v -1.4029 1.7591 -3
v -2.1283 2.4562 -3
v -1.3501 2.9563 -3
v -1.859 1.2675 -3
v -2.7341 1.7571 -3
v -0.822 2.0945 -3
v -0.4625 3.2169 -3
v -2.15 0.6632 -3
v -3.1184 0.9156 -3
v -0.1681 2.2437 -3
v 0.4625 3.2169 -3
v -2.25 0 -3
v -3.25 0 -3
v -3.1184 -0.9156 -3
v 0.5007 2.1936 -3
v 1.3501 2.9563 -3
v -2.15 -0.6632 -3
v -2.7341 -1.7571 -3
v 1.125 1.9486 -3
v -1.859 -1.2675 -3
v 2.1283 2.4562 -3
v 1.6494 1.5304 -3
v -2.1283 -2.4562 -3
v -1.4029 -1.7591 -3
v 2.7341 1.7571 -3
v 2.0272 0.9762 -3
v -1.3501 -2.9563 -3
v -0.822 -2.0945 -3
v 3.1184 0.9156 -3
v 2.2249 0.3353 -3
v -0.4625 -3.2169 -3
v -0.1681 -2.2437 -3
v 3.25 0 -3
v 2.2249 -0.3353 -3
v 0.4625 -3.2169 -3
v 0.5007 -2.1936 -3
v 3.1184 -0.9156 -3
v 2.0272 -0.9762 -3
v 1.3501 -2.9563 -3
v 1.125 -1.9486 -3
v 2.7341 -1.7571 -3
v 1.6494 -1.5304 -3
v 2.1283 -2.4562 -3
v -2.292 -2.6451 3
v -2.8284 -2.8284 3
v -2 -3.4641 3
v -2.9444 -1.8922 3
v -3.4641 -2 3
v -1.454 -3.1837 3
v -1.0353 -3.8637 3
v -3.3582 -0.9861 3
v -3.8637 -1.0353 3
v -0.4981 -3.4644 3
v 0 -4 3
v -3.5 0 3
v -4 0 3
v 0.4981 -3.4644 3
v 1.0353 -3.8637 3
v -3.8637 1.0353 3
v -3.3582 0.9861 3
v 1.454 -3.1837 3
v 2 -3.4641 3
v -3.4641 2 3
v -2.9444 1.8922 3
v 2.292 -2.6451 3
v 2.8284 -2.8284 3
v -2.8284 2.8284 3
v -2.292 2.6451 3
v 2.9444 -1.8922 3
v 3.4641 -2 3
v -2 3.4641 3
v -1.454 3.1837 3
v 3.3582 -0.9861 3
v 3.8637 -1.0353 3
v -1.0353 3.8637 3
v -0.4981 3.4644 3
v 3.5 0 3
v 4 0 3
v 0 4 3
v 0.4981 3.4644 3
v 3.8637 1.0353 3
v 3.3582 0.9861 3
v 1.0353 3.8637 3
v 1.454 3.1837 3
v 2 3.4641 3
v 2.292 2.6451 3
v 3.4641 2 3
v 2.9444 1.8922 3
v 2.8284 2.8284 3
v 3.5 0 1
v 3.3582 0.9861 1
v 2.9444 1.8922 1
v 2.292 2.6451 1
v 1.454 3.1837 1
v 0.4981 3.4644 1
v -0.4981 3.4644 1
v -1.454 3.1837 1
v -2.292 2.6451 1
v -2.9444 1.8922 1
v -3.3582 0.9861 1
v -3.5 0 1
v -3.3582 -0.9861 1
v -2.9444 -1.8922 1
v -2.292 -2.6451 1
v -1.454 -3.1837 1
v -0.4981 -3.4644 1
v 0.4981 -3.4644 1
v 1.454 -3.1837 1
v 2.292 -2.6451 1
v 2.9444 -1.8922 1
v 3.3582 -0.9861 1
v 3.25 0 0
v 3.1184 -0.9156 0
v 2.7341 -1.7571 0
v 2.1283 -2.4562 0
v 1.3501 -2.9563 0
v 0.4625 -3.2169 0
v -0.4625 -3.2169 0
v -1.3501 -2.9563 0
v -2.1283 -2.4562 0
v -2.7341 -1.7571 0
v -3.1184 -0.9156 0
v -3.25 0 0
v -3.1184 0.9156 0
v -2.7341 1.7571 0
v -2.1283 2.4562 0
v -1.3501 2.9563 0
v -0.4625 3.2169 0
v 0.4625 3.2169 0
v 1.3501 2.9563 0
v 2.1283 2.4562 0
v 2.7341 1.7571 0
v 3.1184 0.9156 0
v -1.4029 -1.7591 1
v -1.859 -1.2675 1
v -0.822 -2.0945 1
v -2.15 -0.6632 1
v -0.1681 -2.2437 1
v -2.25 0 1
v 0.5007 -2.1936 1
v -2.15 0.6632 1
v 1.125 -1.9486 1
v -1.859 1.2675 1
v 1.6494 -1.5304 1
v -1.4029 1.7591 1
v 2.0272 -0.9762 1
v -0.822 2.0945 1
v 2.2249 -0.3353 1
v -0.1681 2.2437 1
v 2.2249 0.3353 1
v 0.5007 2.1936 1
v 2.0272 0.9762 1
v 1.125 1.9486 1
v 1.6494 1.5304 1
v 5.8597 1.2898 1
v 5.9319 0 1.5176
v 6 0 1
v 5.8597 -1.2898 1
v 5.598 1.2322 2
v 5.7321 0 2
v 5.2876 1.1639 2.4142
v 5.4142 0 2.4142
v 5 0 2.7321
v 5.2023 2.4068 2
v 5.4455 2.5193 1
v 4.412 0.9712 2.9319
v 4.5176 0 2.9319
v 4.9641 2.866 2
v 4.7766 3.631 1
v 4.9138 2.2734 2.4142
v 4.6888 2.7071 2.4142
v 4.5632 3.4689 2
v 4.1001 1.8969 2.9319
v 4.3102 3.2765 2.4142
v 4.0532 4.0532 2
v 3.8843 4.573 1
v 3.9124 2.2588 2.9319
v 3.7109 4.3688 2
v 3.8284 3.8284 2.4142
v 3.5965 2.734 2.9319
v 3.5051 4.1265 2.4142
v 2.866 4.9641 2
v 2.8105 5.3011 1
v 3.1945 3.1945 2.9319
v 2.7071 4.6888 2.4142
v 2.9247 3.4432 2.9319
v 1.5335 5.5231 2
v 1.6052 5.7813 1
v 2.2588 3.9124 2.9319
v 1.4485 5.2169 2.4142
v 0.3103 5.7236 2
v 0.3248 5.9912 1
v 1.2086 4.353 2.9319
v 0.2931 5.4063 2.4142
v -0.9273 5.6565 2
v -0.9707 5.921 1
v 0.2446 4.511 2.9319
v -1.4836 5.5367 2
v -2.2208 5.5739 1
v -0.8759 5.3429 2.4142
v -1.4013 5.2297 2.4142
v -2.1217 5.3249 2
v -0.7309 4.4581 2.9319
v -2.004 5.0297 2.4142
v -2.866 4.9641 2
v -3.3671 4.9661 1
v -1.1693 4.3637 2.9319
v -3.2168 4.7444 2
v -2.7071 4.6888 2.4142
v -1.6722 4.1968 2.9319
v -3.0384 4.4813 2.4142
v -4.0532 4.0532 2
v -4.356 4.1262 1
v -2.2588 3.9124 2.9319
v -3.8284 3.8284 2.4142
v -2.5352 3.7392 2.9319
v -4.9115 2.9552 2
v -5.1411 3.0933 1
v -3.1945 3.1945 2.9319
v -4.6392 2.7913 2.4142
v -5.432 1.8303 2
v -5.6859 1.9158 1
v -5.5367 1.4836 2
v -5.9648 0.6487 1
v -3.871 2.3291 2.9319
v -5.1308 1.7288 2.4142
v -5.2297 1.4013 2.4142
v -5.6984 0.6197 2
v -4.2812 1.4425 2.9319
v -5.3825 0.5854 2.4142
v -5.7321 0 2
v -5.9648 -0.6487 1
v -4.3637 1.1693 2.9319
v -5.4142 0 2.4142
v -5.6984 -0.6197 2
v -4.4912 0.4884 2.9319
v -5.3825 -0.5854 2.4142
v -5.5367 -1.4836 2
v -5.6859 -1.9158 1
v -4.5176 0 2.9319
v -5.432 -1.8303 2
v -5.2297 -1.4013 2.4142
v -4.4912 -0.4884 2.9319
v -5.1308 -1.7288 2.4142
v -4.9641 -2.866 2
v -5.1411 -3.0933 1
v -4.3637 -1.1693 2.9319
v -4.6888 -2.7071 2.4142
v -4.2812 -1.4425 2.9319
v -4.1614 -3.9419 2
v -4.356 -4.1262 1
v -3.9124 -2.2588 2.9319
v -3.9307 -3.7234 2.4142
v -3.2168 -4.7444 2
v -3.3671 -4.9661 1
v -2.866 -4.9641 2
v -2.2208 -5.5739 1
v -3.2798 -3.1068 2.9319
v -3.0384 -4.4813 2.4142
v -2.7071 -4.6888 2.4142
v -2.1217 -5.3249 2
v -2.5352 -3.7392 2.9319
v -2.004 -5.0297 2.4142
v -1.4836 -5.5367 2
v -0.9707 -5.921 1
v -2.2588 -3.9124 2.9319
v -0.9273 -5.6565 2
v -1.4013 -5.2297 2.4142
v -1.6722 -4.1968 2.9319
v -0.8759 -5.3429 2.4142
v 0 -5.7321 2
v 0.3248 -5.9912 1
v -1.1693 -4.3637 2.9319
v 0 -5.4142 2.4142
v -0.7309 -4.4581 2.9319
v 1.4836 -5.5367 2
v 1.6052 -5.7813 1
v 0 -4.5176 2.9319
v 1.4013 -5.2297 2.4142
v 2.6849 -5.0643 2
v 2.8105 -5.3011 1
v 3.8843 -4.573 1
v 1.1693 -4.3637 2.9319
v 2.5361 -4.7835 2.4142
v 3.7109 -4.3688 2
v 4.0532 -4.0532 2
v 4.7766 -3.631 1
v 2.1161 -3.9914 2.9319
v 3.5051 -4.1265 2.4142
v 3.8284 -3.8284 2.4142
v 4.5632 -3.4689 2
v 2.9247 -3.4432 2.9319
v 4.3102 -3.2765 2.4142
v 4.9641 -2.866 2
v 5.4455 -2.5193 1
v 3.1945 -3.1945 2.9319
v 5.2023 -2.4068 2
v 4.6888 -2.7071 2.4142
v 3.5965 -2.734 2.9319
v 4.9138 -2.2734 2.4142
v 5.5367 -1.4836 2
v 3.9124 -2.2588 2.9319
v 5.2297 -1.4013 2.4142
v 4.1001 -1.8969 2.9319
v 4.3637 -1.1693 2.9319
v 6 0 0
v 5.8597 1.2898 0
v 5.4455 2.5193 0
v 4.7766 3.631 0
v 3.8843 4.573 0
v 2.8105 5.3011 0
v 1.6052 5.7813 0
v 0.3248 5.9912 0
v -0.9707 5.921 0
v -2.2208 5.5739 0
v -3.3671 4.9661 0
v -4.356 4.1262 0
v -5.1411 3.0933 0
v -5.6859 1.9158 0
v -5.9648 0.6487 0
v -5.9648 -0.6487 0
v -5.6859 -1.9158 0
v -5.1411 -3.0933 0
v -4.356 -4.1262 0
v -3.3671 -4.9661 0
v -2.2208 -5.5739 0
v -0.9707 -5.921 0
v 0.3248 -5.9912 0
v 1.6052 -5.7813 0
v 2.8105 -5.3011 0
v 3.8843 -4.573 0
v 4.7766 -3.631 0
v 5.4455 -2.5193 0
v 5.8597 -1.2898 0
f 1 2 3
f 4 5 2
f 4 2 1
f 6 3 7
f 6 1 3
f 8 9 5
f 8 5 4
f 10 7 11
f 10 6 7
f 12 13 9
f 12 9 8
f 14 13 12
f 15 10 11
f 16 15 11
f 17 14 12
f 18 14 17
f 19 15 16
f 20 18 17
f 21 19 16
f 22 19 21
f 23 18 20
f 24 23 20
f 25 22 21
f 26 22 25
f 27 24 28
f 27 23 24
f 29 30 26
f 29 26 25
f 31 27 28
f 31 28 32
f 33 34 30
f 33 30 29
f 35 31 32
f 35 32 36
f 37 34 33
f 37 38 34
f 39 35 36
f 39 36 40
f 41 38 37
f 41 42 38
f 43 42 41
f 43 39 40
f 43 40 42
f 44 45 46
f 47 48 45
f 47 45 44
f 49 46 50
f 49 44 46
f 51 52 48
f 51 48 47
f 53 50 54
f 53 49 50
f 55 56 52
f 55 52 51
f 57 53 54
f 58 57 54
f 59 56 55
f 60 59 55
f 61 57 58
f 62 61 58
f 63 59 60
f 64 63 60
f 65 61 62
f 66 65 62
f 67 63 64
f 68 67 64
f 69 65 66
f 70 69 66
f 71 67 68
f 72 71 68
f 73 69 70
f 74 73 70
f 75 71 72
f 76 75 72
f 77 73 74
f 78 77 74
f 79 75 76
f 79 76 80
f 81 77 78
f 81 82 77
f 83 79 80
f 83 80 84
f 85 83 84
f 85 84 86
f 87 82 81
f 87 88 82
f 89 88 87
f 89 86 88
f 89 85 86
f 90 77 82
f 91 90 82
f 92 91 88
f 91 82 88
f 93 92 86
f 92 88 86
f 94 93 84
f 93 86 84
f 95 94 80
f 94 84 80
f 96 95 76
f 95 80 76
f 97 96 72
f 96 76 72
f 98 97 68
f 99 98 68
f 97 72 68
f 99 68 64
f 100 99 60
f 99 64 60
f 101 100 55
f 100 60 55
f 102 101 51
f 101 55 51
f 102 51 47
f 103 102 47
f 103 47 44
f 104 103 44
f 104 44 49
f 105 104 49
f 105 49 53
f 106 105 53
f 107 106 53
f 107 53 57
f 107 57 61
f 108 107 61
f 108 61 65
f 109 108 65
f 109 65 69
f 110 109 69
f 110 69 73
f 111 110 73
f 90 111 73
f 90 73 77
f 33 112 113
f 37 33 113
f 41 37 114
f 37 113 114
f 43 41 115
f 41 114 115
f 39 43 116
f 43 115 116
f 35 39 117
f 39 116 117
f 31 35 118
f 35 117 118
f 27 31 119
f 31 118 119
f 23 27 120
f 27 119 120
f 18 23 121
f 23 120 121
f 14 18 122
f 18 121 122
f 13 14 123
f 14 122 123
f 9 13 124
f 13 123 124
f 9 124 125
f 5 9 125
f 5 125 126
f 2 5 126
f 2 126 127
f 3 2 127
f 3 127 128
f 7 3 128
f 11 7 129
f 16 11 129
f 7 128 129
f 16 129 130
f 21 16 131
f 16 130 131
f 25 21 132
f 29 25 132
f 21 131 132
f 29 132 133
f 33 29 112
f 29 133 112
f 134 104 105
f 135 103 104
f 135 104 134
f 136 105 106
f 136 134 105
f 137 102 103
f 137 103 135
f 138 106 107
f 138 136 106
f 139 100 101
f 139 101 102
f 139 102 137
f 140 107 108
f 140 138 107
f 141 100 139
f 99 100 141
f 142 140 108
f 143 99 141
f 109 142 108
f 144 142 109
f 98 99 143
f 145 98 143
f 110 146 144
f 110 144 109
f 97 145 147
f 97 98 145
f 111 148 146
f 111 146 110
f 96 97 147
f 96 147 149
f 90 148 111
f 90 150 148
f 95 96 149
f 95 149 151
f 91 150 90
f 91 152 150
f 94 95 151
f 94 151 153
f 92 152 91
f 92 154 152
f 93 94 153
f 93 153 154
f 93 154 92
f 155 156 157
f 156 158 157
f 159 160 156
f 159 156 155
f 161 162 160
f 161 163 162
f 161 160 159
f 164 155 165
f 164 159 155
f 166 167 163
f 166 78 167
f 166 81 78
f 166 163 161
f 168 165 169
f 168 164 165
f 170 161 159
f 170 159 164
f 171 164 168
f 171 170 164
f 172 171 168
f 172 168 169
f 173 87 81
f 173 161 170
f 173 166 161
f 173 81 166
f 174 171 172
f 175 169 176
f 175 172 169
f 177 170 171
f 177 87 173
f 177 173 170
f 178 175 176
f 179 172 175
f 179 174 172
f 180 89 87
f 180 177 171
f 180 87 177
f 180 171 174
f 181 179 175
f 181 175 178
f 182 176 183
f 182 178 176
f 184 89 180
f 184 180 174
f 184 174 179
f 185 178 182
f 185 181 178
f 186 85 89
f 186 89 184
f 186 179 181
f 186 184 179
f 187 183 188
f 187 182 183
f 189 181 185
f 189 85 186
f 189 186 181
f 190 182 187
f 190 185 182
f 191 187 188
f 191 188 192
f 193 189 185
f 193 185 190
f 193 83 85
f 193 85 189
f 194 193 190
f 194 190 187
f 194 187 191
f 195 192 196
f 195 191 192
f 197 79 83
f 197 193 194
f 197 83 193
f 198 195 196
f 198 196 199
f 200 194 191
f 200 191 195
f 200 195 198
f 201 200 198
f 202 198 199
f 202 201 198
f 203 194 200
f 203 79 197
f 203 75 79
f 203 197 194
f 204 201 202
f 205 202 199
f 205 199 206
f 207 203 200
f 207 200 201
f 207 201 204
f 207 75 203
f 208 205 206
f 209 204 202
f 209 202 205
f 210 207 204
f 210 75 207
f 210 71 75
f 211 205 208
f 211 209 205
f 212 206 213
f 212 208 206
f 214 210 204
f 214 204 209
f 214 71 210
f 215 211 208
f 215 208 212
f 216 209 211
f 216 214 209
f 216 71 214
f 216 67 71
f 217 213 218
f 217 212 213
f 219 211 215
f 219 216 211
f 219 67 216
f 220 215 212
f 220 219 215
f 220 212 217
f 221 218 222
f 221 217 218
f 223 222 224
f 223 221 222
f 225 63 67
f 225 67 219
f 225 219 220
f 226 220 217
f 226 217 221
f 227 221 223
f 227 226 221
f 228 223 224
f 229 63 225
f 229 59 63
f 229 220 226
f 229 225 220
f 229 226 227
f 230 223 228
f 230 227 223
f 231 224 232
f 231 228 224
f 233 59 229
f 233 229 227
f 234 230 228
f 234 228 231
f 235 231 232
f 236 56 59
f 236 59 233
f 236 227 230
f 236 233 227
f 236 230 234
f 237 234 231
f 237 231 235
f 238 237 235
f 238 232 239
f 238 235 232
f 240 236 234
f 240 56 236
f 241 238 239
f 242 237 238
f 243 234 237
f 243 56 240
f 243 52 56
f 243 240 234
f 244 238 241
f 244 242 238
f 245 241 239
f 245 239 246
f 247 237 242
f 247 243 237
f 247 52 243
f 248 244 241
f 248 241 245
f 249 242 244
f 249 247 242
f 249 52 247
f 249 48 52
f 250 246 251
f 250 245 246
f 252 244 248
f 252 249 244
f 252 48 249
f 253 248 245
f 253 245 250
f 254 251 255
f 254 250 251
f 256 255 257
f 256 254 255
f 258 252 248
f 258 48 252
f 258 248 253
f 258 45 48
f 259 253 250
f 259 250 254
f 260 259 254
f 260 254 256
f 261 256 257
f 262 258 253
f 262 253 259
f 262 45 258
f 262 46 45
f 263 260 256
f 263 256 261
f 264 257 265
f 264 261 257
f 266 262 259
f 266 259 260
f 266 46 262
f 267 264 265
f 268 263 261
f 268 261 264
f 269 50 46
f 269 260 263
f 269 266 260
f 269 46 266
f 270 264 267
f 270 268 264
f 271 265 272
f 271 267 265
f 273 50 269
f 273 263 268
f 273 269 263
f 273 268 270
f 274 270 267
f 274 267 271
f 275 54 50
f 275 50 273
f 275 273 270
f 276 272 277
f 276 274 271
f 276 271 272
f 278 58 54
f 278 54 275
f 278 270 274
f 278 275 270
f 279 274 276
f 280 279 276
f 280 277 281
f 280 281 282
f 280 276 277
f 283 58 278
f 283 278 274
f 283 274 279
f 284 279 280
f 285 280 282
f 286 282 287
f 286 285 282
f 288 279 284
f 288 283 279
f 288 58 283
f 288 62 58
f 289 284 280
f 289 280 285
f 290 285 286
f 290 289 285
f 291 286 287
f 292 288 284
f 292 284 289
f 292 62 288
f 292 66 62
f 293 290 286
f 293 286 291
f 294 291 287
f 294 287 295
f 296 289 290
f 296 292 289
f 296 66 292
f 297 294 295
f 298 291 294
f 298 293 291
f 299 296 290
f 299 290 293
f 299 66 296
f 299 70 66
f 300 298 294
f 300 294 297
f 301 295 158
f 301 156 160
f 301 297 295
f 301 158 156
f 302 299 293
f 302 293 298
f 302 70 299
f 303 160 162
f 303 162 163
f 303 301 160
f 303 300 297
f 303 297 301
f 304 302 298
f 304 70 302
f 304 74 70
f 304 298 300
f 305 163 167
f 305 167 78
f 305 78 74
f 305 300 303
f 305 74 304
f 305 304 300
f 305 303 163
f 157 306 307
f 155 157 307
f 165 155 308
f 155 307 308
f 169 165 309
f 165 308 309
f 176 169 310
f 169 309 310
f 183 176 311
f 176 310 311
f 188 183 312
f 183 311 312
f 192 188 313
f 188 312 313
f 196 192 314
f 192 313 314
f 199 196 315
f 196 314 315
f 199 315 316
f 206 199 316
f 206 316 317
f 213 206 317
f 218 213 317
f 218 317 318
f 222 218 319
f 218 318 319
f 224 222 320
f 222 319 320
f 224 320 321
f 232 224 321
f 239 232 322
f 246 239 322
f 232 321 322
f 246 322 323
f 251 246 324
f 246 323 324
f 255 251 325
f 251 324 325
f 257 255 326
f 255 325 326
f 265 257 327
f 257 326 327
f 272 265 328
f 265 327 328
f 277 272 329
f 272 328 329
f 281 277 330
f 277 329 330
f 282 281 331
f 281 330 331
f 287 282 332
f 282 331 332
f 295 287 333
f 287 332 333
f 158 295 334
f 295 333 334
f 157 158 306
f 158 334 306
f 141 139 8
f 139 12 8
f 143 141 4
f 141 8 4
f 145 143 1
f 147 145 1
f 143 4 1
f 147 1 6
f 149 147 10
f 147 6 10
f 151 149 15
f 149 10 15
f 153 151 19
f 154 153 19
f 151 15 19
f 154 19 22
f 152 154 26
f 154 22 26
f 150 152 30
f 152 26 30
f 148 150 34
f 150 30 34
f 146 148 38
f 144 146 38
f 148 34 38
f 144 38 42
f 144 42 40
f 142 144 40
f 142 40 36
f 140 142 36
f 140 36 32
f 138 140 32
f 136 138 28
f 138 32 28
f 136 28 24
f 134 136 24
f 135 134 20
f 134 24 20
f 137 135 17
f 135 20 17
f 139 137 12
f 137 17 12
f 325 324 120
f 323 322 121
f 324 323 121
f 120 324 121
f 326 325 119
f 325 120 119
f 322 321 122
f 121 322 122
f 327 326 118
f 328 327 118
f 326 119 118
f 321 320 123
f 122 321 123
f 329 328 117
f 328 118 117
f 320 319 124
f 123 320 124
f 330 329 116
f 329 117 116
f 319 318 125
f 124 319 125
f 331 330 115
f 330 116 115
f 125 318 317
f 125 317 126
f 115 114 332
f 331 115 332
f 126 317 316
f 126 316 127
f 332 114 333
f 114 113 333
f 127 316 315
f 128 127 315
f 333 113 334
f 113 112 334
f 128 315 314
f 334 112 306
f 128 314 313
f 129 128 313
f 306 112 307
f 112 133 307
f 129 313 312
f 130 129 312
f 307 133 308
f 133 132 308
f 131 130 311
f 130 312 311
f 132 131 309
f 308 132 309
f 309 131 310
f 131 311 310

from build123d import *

# Parameters (mm, degrees)
SKETCH_R         = 6
PAD_DEPTH        = 3
SKETCH002_R      = 3.25
PAD001_DEPTH     = 3
HOLE_D           = 4.5
HOLE_DEPTH       = 25
HOLE_CBORE_D     = 7
HOLE_CBORE_DEPTH = 2
FILLET_R         = 2


with BuildPart() as part:
    # Sketch → Pad (new body)
    with BuildSketch(Plane.XY):
        Circle(SKETCH_R)
    extrude(amount=PAD_DEPTH)

    # Sketch002 → Pad001 (join)
    with BuildSketch(Plane(origin=(0, 0, 0), x_dir=(1, 0, 0), z_dir=(0, 0, -1))):
        Circle(SKETCH002_R)
    extrude(amount=PAD001_DEPTH)

    # Hole
    with Locations(Plane.XY.offset(3)):
        with Locations((0, 0)):
            CounterBoreHole(HOLE_D / 2, HOLE_CBORE_D / 2, HOLE_CBORE_DEPTH, depth=HOLE_DEPTH)

    # Fillet
    fillet_edges = [part.edges().sort_by_distance(p)[0] for p in [
        (-6, 0, 3),
    ]]
    fillet(fillet_edges, radius=FILLET_R)


solid = part.part
